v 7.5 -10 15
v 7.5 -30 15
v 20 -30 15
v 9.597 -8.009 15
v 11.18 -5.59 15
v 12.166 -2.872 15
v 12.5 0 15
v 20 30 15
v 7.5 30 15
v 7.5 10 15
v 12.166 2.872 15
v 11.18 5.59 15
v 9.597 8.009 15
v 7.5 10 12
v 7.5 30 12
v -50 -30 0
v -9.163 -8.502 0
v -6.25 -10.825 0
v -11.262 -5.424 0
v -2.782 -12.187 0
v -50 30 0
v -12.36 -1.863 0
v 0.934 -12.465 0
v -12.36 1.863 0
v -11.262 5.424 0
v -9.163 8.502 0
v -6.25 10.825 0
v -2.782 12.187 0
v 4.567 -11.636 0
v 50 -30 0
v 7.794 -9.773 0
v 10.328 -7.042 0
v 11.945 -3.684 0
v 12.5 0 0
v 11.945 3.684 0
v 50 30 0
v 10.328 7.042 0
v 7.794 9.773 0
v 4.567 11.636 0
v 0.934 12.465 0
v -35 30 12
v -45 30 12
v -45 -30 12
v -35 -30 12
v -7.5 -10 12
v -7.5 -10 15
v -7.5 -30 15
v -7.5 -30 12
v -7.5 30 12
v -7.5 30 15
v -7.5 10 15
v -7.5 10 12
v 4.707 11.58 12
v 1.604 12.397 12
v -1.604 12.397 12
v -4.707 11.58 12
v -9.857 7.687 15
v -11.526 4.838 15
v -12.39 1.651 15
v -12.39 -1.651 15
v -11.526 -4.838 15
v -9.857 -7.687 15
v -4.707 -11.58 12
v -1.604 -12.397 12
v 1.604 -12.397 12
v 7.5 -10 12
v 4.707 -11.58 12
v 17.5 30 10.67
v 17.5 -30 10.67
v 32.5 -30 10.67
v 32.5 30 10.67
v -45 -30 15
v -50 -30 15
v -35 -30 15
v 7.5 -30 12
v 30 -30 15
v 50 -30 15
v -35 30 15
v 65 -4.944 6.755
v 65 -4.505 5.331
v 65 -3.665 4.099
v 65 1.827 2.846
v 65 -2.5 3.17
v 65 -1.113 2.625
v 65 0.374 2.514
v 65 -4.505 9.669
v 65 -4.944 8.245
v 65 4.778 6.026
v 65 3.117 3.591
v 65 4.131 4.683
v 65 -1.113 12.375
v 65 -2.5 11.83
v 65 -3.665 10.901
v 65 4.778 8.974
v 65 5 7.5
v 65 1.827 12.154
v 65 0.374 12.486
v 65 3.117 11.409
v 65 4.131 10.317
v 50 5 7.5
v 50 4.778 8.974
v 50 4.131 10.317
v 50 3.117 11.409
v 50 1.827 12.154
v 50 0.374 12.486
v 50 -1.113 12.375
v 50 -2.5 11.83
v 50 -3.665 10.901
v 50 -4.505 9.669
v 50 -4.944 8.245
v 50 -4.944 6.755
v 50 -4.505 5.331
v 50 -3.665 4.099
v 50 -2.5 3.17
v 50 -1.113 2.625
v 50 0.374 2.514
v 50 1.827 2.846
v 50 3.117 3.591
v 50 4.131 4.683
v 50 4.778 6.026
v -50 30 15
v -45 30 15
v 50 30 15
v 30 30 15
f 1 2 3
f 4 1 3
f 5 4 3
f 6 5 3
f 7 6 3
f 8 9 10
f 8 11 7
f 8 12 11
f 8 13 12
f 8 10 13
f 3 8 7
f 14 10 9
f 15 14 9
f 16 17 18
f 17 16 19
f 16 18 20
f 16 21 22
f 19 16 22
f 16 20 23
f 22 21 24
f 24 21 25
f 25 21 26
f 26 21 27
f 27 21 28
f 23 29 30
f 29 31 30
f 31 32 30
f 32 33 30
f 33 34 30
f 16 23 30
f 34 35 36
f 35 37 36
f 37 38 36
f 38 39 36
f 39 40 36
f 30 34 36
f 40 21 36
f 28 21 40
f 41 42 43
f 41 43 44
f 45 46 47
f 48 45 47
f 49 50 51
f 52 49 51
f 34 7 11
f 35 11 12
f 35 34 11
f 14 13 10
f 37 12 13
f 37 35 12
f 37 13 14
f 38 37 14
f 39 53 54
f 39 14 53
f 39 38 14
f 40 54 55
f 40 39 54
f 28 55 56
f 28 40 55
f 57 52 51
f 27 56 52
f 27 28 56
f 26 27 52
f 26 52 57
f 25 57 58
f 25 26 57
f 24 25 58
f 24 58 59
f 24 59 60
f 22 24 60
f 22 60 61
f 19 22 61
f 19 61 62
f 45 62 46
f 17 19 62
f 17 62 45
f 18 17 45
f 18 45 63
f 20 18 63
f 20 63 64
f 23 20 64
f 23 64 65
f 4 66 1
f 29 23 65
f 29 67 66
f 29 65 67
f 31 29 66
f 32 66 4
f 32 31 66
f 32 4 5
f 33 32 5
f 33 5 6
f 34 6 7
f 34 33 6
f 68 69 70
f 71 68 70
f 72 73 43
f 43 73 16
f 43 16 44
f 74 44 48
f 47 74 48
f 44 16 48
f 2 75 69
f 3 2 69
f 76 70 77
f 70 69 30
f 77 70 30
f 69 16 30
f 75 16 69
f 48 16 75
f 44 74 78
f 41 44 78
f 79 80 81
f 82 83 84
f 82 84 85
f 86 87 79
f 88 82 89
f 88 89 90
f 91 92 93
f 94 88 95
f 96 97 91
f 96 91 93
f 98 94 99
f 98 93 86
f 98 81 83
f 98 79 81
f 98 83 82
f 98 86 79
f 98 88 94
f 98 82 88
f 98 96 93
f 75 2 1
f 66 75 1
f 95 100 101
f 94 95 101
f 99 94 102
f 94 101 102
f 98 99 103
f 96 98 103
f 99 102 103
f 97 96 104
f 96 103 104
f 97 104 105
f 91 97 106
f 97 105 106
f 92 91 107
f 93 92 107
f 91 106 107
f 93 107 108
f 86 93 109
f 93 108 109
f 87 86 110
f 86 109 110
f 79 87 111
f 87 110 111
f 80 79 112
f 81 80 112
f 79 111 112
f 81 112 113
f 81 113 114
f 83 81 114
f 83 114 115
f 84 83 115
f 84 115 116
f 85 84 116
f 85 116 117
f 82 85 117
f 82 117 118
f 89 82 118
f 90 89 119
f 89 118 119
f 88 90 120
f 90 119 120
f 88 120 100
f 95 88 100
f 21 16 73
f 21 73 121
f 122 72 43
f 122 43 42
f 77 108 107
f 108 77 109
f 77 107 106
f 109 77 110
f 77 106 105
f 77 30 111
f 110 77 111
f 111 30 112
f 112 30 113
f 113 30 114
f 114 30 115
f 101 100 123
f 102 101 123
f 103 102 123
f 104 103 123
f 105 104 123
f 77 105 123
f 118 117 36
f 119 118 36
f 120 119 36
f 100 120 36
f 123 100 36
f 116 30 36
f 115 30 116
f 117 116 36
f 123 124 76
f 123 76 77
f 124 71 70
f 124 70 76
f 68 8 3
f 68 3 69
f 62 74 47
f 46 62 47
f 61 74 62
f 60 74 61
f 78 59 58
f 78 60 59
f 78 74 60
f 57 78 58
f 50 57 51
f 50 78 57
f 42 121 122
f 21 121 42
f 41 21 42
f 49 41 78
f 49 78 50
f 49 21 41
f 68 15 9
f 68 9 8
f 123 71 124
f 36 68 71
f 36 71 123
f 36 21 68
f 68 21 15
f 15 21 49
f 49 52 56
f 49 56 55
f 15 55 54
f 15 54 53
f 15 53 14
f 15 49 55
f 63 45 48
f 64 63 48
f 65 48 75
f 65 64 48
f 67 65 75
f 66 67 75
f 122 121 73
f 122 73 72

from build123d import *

# Parameters (mm, degrees)
F0_W     = 100
F0_H     = 60
F0_R     = 12.5
F1_DEPTH = 15
F2_W     = 10
F2_H     = 60
F3_DEPTH = 3
F5_DEPTH = 60.001
F6_R     = 5
F7_DEPTH = 15


with BuildPart() as f1:
    # F0 (on Top) → F1 (new body)
    with BuildSketch(Plane.XY):
        Rectangle(F0_W, F0_H)
        Circle(F0_R, mode=Mode.SUBTRACT)
    extrude(amount=F1_DEPTH)

    # F2 (on face) → F3 (cut)
    with BuildSketch(Plane.XY.offset(15)):
        with BuildLine():
            Line((7.5, 30), (-7.5, 30))
            Line((-7.5, 30), (-7.5, 10))
            ThreePointArc((-7.5, 10), (0, 12.5), (7.5, 10))
            Line((7.5, 10), (7.5, 30))
        make_face()
        with BuildLine():
            Line((-7.5, -10), (-7.5, -30))
            Line((-7.5, -30), (7.5, -30))
            Line((7.5, -30), (7.5, -10))
            ThreePointArc((7.5, -10), (0, -12.5), (-7.5, -10))
        make_face()
        with Locations((-40, 0)):
            Rectangle(F2_W, F2_H)
    extrude(amount=-F3_DEPTH, mode=Mode.SUBTRACT)

    # F4 (on face) → F5 (cut, through all)
    with BuildSketch(Plane.XZ.offset(30)):
        Polygon((30, 15), (20, 15), (17.5, 10.669873), (32.5, 10.669873), align=None)
    extrude(amount=-F5_DEPTH, mode=Mode.SUBTRACT)

    # F6 (on face) → F7 (join)
    with BuildSketch(Plane.YZ.offset(50)):
        with Locations((0, 7.5)):
            Circle(F6_R)
    extrude(amount=F7_DEPTH)


solid = f1.part
